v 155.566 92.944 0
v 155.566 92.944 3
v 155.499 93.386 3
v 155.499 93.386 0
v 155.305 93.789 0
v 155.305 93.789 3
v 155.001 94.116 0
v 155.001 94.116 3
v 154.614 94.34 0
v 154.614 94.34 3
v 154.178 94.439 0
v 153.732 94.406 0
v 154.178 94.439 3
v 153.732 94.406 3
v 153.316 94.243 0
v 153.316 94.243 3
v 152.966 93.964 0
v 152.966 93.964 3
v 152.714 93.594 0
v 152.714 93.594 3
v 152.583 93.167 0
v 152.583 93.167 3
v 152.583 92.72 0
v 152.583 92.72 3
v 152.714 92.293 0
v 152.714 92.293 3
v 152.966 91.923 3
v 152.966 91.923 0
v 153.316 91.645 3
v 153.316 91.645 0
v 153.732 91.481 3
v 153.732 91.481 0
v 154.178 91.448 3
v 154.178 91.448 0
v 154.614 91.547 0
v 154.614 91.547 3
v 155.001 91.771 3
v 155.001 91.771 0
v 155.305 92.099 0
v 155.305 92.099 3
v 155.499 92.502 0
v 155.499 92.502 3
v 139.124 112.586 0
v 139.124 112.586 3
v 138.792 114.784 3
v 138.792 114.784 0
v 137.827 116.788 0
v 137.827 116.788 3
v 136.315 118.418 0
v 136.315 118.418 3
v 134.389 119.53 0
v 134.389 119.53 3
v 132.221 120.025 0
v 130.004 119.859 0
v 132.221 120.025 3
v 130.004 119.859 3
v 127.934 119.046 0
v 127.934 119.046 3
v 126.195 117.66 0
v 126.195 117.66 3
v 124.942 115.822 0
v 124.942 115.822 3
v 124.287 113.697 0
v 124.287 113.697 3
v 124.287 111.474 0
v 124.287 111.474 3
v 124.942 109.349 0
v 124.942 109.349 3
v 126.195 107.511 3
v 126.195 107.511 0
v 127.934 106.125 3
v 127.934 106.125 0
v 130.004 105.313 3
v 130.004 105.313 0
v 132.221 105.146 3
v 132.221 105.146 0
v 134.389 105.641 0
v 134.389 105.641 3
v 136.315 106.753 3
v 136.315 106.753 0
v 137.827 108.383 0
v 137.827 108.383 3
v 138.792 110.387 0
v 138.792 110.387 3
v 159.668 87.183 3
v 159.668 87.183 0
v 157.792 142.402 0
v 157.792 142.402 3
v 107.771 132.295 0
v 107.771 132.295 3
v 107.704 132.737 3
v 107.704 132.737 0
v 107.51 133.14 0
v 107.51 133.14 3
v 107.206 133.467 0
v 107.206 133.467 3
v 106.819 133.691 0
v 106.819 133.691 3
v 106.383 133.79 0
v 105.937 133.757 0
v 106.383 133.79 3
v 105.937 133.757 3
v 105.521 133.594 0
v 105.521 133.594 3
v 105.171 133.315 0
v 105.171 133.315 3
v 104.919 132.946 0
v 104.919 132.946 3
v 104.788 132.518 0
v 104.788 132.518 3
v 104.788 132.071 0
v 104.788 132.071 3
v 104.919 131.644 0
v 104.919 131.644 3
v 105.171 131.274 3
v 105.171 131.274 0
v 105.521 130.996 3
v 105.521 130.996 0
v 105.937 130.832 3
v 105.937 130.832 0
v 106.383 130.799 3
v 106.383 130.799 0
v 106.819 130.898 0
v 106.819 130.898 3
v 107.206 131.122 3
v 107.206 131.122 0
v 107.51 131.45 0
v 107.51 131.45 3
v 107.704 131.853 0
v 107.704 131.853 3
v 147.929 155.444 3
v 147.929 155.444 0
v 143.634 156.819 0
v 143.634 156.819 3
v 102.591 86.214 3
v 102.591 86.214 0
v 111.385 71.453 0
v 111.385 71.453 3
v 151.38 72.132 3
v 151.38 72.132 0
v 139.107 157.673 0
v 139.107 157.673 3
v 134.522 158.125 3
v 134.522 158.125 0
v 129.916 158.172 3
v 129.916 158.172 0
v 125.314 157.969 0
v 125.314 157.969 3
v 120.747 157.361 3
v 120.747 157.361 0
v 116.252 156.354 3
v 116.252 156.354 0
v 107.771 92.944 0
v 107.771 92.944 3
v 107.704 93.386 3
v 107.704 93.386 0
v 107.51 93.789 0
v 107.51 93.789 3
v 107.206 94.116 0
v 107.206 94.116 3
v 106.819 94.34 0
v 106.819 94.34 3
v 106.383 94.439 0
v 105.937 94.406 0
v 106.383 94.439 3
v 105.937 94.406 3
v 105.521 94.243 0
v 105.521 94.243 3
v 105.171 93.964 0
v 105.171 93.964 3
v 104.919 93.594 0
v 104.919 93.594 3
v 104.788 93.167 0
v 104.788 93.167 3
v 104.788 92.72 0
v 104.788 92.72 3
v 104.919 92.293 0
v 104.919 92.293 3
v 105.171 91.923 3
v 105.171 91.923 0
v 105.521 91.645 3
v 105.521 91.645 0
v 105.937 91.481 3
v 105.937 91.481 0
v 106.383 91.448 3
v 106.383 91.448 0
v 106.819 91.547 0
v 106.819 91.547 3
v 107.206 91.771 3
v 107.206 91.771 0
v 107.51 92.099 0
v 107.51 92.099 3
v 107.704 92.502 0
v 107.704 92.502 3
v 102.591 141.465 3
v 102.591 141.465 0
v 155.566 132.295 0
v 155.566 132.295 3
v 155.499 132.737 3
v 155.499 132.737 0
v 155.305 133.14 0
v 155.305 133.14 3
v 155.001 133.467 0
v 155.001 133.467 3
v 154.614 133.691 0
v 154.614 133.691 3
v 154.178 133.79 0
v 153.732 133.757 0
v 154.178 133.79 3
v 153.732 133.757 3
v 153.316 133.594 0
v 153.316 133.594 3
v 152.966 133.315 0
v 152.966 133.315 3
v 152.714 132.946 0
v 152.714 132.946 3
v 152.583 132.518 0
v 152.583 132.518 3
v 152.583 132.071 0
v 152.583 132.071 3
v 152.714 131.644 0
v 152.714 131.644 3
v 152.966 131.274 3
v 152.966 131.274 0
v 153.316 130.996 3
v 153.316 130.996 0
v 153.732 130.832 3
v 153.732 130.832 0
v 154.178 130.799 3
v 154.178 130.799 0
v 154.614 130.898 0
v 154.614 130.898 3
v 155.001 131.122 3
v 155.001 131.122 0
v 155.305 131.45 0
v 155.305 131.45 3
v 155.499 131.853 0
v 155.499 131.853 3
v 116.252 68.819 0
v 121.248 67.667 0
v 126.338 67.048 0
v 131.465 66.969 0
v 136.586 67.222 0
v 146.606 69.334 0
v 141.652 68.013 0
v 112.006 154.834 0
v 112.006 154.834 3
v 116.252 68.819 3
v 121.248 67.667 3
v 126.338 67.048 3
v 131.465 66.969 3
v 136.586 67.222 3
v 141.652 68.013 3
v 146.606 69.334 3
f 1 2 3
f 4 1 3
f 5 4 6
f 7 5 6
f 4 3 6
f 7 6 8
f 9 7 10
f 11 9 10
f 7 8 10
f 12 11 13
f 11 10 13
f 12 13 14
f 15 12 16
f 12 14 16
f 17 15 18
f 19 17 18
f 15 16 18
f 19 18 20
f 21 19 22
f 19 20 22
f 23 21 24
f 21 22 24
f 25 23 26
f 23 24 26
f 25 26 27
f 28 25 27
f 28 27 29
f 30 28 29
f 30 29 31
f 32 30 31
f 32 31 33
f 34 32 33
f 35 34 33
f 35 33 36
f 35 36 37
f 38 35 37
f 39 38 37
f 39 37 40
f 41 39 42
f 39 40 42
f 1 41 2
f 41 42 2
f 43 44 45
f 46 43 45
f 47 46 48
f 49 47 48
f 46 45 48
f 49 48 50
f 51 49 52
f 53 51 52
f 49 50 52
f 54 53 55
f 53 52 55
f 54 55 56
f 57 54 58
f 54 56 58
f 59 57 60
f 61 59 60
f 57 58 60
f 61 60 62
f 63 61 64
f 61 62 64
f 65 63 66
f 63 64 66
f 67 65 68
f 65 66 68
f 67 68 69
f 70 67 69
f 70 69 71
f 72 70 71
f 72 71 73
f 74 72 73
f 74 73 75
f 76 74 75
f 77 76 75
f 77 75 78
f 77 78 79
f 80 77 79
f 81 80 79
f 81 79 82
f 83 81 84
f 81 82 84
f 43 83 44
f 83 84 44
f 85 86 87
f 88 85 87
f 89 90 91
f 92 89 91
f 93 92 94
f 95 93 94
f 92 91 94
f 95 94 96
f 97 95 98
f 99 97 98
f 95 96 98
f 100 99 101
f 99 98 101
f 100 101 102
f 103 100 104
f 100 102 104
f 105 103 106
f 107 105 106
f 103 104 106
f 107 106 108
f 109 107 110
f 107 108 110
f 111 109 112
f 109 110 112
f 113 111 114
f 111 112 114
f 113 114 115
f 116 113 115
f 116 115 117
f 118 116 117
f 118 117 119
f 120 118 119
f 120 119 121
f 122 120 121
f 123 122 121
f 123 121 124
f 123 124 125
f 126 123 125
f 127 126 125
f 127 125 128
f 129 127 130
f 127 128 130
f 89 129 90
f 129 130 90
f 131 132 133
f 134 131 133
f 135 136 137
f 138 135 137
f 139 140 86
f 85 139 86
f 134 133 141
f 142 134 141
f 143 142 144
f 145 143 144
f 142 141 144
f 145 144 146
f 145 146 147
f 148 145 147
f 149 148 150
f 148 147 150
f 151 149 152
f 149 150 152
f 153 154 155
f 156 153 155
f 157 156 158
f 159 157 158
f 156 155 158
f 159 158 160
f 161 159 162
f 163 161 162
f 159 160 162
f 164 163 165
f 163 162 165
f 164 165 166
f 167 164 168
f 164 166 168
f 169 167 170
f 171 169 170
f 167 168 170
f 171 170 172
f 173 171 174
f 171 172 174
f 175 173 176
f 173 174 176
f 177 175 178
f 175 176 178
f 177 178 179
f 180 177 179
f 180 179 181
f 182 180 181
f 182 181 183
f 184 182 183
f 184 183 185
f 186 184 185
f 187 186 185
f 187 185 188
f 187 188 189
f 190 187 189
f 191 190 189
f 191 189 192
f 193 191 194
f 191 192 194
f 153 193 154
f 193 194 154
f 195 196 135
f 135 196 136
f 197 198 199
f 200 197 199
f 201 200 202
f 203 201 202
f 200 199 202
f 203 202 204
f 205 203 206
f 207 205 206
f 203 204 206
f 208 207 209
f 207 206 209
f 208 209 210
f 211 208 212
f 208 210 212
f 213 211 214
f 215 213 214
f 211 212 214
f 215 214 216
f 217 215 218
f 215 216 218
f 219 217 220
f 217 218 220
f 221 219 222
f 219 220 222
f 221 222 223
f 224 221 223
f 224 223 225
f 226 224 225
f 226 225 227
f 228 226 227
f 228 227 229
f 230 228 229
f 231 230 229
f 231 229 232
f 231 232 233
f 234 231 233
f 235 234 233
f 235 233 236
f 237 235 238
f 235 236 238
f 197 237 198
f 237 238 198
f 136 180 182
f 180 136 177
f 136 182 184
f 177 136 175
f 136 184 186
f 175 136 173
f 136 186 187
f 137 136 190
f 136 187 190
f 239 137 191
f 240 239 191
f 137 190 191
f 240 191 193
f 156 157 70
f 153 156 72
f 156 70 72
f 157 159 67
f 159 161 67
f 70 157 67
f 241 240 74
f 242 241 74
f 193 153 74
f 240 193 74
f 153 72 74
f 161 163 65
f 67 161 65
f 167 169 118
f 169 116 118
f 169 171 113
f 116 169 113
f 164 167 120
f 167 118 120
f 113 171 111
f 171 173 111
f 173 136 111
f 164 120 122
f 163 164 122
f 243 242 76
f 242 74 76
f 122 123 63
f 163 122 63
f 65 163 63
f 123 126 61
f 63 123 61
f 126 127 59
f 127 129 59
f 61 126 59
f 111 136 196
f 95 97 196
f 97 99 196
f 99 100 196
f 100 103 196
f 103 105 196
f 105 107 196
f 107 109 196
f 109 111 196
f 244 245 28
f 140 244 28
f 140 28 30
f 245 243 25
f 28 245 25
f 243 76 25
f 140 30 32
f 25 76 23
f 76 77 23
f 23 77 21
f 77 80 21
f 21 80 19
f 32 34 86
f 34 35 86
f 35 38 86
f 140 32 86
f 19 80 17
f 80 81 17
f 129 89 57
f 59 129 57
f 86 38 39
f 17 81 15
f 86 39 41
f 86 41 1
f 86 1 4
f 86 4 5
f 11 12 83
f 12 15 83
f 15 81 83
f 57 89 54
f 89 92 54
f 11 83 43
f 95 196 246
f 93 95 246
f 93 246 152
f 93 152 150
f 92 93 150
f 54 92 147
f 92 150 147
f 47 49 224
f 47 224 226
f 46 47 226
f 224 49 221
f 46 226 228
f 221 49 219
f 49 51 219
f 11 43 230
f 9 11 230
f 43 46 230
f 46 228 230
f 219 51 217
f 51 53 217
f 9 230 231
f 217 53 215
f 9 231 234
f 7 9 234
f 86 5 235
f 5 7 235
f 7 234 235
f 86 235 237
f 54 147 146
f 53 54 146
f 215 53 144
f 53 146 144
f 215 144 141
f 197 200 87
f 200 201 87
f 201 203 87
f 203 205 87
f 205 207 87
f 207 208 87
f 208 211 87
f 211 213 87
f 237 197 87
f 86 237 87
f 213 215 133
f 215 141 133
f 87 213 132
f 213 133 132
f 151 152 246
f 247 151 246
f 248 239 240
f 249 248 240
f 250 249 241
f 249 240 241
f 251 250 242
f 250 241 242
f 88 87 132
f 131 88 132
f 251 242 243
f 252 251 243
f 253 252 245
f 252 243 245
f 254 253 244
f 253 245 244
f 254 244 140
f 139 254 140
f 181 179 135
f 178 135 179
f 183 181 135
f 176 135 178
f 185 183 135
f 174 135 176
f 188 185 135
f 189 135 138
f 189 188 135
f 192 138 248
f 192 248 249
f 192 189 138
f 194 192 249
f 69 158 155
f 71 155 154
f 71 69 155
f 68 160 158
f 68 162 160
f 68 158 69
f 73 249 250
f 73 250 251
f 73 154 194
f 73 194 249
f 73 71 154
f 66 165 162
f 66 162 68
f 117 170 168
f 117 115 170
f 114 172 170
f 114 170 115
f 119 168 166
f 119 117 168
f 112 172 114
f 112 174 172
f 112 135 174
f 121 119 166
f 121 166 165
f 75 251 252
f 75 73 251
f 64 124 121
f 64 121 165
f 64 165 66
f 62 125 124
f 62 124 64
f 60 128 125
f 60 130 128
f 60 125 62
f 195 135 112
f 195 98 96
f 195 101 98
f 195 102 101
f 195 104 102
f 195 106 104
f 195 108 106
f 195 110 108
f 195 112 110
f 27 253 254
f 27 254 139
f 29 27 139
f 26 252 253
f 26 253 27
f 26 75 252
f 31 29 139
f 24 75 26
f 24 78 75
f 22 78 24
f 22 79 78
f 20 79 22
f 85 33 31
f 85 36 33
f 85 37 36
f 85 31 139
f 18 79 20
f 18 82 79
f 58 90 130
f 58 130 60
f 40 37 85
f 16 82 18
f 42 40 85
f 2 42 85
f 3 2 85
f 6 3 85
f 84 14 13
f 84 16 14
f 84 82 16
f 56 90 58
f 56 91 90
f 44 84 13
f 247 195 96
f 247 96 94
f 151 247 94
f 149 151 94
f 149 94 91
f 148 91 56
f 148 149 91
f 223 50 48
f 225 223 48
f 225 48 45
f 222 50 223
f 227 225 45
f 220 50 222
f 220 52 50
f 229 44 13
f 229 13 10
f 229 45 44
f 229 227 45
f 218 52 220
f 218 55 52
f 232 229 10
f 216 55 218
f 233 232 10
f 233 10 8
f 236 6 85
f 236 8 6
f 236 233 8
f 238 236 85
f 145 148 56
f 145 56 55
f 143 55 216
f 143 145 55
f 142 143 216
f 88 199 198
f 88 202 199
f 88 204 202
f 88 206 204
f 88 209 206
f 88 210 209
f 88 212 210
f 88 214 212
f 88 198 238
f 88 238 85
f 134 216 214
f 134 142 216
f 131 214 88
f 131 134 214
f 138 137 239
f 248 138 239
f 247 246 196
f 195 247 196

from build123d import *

# Parameters (mm, degrees)
BOSS_EXTRUDE2_DEPTH = 3
SKETCH3_R           = 1.5
SKETCH3_R_2         = 7.46
CUT_EXTRUDE1_DEPTH  = 3


with BuildPart() as part:
    # Sketch2 → Boss-Extrude2 (new body)
    with BuildSketch(Plane.XY):
        with BuildLine():
            Line((116.251704746, 156.353577499), (112.006054704, 154.834164358))
            Line((112.006054704, 154.834164358), (102.590821765, 141.464685362))
            Line((102.590821765, 141.464685362), (102.590821765, 86.213632981))
            Line((102.590821765, 86.213632981), (111.385068158, 71.453251655))
            Line((111.385068158, 71.453251655), (116.251704746, 68.818910417))
            ThreePointArc((116.251704746, 68.818910417), (123.784731531, 67.289899242), (131.464672299, 66.969153974))
            ThreePointArc((131.464672299, 66.969153974), (139.129294477, 67.550475385), (146.606062492, 69.334377784))
            Line((146.606062492, 69.334377784), (151.380447861, 72.132439574))
            Line((151.380447861, 72.132439574), (159.66845659, 87.18290594))
            Line((159.66845659, 87.18290594), (157.79248846, 142.402101269))
            Line((157.79248846, 142.402101269), (147.928743251, 155.444191223))
            Line((147.928743251, 155.444191223), (143.63395176, 156.818573493))
            ThreePointArc((143.63395176, 156.818573493), (136.819761385, 157.949780649), (129.915894372, 158.172132571))
            ThreePointArc((129.915894372, 158.172132571), (123.023557673, 157.715498216), (116.251704746, 156.353577499))
        make_face()
    extrude(amount=BOSS_EXTRUDE2_DEPTH)

    # Sketch3 → Cut-Extrude1 (cut)
    with BuildSketch(Plane.XY.offset(3)):
        with Locations((106.270821765, 132.294685362)):
            Circle(SKETCH3_R)
        with Locations((106.270821765, 92.943632981)):
            Circle(SKETCH3_R)
        with Locations((154.065868873, 132.294685362)):
            Circle(SKETCH3_R)
        with Locations((154.065868873, 92.943632981)):
            Circle(SKETCH3_R)
        with Locations((131.66355574, 112.585551326)):
            Circle(SKETCH3_R_2)
    extrude(amount=-CUT_EXTRUDE1_DEPTH, mode=Mode.SUBTRACT)


solid = part.part
